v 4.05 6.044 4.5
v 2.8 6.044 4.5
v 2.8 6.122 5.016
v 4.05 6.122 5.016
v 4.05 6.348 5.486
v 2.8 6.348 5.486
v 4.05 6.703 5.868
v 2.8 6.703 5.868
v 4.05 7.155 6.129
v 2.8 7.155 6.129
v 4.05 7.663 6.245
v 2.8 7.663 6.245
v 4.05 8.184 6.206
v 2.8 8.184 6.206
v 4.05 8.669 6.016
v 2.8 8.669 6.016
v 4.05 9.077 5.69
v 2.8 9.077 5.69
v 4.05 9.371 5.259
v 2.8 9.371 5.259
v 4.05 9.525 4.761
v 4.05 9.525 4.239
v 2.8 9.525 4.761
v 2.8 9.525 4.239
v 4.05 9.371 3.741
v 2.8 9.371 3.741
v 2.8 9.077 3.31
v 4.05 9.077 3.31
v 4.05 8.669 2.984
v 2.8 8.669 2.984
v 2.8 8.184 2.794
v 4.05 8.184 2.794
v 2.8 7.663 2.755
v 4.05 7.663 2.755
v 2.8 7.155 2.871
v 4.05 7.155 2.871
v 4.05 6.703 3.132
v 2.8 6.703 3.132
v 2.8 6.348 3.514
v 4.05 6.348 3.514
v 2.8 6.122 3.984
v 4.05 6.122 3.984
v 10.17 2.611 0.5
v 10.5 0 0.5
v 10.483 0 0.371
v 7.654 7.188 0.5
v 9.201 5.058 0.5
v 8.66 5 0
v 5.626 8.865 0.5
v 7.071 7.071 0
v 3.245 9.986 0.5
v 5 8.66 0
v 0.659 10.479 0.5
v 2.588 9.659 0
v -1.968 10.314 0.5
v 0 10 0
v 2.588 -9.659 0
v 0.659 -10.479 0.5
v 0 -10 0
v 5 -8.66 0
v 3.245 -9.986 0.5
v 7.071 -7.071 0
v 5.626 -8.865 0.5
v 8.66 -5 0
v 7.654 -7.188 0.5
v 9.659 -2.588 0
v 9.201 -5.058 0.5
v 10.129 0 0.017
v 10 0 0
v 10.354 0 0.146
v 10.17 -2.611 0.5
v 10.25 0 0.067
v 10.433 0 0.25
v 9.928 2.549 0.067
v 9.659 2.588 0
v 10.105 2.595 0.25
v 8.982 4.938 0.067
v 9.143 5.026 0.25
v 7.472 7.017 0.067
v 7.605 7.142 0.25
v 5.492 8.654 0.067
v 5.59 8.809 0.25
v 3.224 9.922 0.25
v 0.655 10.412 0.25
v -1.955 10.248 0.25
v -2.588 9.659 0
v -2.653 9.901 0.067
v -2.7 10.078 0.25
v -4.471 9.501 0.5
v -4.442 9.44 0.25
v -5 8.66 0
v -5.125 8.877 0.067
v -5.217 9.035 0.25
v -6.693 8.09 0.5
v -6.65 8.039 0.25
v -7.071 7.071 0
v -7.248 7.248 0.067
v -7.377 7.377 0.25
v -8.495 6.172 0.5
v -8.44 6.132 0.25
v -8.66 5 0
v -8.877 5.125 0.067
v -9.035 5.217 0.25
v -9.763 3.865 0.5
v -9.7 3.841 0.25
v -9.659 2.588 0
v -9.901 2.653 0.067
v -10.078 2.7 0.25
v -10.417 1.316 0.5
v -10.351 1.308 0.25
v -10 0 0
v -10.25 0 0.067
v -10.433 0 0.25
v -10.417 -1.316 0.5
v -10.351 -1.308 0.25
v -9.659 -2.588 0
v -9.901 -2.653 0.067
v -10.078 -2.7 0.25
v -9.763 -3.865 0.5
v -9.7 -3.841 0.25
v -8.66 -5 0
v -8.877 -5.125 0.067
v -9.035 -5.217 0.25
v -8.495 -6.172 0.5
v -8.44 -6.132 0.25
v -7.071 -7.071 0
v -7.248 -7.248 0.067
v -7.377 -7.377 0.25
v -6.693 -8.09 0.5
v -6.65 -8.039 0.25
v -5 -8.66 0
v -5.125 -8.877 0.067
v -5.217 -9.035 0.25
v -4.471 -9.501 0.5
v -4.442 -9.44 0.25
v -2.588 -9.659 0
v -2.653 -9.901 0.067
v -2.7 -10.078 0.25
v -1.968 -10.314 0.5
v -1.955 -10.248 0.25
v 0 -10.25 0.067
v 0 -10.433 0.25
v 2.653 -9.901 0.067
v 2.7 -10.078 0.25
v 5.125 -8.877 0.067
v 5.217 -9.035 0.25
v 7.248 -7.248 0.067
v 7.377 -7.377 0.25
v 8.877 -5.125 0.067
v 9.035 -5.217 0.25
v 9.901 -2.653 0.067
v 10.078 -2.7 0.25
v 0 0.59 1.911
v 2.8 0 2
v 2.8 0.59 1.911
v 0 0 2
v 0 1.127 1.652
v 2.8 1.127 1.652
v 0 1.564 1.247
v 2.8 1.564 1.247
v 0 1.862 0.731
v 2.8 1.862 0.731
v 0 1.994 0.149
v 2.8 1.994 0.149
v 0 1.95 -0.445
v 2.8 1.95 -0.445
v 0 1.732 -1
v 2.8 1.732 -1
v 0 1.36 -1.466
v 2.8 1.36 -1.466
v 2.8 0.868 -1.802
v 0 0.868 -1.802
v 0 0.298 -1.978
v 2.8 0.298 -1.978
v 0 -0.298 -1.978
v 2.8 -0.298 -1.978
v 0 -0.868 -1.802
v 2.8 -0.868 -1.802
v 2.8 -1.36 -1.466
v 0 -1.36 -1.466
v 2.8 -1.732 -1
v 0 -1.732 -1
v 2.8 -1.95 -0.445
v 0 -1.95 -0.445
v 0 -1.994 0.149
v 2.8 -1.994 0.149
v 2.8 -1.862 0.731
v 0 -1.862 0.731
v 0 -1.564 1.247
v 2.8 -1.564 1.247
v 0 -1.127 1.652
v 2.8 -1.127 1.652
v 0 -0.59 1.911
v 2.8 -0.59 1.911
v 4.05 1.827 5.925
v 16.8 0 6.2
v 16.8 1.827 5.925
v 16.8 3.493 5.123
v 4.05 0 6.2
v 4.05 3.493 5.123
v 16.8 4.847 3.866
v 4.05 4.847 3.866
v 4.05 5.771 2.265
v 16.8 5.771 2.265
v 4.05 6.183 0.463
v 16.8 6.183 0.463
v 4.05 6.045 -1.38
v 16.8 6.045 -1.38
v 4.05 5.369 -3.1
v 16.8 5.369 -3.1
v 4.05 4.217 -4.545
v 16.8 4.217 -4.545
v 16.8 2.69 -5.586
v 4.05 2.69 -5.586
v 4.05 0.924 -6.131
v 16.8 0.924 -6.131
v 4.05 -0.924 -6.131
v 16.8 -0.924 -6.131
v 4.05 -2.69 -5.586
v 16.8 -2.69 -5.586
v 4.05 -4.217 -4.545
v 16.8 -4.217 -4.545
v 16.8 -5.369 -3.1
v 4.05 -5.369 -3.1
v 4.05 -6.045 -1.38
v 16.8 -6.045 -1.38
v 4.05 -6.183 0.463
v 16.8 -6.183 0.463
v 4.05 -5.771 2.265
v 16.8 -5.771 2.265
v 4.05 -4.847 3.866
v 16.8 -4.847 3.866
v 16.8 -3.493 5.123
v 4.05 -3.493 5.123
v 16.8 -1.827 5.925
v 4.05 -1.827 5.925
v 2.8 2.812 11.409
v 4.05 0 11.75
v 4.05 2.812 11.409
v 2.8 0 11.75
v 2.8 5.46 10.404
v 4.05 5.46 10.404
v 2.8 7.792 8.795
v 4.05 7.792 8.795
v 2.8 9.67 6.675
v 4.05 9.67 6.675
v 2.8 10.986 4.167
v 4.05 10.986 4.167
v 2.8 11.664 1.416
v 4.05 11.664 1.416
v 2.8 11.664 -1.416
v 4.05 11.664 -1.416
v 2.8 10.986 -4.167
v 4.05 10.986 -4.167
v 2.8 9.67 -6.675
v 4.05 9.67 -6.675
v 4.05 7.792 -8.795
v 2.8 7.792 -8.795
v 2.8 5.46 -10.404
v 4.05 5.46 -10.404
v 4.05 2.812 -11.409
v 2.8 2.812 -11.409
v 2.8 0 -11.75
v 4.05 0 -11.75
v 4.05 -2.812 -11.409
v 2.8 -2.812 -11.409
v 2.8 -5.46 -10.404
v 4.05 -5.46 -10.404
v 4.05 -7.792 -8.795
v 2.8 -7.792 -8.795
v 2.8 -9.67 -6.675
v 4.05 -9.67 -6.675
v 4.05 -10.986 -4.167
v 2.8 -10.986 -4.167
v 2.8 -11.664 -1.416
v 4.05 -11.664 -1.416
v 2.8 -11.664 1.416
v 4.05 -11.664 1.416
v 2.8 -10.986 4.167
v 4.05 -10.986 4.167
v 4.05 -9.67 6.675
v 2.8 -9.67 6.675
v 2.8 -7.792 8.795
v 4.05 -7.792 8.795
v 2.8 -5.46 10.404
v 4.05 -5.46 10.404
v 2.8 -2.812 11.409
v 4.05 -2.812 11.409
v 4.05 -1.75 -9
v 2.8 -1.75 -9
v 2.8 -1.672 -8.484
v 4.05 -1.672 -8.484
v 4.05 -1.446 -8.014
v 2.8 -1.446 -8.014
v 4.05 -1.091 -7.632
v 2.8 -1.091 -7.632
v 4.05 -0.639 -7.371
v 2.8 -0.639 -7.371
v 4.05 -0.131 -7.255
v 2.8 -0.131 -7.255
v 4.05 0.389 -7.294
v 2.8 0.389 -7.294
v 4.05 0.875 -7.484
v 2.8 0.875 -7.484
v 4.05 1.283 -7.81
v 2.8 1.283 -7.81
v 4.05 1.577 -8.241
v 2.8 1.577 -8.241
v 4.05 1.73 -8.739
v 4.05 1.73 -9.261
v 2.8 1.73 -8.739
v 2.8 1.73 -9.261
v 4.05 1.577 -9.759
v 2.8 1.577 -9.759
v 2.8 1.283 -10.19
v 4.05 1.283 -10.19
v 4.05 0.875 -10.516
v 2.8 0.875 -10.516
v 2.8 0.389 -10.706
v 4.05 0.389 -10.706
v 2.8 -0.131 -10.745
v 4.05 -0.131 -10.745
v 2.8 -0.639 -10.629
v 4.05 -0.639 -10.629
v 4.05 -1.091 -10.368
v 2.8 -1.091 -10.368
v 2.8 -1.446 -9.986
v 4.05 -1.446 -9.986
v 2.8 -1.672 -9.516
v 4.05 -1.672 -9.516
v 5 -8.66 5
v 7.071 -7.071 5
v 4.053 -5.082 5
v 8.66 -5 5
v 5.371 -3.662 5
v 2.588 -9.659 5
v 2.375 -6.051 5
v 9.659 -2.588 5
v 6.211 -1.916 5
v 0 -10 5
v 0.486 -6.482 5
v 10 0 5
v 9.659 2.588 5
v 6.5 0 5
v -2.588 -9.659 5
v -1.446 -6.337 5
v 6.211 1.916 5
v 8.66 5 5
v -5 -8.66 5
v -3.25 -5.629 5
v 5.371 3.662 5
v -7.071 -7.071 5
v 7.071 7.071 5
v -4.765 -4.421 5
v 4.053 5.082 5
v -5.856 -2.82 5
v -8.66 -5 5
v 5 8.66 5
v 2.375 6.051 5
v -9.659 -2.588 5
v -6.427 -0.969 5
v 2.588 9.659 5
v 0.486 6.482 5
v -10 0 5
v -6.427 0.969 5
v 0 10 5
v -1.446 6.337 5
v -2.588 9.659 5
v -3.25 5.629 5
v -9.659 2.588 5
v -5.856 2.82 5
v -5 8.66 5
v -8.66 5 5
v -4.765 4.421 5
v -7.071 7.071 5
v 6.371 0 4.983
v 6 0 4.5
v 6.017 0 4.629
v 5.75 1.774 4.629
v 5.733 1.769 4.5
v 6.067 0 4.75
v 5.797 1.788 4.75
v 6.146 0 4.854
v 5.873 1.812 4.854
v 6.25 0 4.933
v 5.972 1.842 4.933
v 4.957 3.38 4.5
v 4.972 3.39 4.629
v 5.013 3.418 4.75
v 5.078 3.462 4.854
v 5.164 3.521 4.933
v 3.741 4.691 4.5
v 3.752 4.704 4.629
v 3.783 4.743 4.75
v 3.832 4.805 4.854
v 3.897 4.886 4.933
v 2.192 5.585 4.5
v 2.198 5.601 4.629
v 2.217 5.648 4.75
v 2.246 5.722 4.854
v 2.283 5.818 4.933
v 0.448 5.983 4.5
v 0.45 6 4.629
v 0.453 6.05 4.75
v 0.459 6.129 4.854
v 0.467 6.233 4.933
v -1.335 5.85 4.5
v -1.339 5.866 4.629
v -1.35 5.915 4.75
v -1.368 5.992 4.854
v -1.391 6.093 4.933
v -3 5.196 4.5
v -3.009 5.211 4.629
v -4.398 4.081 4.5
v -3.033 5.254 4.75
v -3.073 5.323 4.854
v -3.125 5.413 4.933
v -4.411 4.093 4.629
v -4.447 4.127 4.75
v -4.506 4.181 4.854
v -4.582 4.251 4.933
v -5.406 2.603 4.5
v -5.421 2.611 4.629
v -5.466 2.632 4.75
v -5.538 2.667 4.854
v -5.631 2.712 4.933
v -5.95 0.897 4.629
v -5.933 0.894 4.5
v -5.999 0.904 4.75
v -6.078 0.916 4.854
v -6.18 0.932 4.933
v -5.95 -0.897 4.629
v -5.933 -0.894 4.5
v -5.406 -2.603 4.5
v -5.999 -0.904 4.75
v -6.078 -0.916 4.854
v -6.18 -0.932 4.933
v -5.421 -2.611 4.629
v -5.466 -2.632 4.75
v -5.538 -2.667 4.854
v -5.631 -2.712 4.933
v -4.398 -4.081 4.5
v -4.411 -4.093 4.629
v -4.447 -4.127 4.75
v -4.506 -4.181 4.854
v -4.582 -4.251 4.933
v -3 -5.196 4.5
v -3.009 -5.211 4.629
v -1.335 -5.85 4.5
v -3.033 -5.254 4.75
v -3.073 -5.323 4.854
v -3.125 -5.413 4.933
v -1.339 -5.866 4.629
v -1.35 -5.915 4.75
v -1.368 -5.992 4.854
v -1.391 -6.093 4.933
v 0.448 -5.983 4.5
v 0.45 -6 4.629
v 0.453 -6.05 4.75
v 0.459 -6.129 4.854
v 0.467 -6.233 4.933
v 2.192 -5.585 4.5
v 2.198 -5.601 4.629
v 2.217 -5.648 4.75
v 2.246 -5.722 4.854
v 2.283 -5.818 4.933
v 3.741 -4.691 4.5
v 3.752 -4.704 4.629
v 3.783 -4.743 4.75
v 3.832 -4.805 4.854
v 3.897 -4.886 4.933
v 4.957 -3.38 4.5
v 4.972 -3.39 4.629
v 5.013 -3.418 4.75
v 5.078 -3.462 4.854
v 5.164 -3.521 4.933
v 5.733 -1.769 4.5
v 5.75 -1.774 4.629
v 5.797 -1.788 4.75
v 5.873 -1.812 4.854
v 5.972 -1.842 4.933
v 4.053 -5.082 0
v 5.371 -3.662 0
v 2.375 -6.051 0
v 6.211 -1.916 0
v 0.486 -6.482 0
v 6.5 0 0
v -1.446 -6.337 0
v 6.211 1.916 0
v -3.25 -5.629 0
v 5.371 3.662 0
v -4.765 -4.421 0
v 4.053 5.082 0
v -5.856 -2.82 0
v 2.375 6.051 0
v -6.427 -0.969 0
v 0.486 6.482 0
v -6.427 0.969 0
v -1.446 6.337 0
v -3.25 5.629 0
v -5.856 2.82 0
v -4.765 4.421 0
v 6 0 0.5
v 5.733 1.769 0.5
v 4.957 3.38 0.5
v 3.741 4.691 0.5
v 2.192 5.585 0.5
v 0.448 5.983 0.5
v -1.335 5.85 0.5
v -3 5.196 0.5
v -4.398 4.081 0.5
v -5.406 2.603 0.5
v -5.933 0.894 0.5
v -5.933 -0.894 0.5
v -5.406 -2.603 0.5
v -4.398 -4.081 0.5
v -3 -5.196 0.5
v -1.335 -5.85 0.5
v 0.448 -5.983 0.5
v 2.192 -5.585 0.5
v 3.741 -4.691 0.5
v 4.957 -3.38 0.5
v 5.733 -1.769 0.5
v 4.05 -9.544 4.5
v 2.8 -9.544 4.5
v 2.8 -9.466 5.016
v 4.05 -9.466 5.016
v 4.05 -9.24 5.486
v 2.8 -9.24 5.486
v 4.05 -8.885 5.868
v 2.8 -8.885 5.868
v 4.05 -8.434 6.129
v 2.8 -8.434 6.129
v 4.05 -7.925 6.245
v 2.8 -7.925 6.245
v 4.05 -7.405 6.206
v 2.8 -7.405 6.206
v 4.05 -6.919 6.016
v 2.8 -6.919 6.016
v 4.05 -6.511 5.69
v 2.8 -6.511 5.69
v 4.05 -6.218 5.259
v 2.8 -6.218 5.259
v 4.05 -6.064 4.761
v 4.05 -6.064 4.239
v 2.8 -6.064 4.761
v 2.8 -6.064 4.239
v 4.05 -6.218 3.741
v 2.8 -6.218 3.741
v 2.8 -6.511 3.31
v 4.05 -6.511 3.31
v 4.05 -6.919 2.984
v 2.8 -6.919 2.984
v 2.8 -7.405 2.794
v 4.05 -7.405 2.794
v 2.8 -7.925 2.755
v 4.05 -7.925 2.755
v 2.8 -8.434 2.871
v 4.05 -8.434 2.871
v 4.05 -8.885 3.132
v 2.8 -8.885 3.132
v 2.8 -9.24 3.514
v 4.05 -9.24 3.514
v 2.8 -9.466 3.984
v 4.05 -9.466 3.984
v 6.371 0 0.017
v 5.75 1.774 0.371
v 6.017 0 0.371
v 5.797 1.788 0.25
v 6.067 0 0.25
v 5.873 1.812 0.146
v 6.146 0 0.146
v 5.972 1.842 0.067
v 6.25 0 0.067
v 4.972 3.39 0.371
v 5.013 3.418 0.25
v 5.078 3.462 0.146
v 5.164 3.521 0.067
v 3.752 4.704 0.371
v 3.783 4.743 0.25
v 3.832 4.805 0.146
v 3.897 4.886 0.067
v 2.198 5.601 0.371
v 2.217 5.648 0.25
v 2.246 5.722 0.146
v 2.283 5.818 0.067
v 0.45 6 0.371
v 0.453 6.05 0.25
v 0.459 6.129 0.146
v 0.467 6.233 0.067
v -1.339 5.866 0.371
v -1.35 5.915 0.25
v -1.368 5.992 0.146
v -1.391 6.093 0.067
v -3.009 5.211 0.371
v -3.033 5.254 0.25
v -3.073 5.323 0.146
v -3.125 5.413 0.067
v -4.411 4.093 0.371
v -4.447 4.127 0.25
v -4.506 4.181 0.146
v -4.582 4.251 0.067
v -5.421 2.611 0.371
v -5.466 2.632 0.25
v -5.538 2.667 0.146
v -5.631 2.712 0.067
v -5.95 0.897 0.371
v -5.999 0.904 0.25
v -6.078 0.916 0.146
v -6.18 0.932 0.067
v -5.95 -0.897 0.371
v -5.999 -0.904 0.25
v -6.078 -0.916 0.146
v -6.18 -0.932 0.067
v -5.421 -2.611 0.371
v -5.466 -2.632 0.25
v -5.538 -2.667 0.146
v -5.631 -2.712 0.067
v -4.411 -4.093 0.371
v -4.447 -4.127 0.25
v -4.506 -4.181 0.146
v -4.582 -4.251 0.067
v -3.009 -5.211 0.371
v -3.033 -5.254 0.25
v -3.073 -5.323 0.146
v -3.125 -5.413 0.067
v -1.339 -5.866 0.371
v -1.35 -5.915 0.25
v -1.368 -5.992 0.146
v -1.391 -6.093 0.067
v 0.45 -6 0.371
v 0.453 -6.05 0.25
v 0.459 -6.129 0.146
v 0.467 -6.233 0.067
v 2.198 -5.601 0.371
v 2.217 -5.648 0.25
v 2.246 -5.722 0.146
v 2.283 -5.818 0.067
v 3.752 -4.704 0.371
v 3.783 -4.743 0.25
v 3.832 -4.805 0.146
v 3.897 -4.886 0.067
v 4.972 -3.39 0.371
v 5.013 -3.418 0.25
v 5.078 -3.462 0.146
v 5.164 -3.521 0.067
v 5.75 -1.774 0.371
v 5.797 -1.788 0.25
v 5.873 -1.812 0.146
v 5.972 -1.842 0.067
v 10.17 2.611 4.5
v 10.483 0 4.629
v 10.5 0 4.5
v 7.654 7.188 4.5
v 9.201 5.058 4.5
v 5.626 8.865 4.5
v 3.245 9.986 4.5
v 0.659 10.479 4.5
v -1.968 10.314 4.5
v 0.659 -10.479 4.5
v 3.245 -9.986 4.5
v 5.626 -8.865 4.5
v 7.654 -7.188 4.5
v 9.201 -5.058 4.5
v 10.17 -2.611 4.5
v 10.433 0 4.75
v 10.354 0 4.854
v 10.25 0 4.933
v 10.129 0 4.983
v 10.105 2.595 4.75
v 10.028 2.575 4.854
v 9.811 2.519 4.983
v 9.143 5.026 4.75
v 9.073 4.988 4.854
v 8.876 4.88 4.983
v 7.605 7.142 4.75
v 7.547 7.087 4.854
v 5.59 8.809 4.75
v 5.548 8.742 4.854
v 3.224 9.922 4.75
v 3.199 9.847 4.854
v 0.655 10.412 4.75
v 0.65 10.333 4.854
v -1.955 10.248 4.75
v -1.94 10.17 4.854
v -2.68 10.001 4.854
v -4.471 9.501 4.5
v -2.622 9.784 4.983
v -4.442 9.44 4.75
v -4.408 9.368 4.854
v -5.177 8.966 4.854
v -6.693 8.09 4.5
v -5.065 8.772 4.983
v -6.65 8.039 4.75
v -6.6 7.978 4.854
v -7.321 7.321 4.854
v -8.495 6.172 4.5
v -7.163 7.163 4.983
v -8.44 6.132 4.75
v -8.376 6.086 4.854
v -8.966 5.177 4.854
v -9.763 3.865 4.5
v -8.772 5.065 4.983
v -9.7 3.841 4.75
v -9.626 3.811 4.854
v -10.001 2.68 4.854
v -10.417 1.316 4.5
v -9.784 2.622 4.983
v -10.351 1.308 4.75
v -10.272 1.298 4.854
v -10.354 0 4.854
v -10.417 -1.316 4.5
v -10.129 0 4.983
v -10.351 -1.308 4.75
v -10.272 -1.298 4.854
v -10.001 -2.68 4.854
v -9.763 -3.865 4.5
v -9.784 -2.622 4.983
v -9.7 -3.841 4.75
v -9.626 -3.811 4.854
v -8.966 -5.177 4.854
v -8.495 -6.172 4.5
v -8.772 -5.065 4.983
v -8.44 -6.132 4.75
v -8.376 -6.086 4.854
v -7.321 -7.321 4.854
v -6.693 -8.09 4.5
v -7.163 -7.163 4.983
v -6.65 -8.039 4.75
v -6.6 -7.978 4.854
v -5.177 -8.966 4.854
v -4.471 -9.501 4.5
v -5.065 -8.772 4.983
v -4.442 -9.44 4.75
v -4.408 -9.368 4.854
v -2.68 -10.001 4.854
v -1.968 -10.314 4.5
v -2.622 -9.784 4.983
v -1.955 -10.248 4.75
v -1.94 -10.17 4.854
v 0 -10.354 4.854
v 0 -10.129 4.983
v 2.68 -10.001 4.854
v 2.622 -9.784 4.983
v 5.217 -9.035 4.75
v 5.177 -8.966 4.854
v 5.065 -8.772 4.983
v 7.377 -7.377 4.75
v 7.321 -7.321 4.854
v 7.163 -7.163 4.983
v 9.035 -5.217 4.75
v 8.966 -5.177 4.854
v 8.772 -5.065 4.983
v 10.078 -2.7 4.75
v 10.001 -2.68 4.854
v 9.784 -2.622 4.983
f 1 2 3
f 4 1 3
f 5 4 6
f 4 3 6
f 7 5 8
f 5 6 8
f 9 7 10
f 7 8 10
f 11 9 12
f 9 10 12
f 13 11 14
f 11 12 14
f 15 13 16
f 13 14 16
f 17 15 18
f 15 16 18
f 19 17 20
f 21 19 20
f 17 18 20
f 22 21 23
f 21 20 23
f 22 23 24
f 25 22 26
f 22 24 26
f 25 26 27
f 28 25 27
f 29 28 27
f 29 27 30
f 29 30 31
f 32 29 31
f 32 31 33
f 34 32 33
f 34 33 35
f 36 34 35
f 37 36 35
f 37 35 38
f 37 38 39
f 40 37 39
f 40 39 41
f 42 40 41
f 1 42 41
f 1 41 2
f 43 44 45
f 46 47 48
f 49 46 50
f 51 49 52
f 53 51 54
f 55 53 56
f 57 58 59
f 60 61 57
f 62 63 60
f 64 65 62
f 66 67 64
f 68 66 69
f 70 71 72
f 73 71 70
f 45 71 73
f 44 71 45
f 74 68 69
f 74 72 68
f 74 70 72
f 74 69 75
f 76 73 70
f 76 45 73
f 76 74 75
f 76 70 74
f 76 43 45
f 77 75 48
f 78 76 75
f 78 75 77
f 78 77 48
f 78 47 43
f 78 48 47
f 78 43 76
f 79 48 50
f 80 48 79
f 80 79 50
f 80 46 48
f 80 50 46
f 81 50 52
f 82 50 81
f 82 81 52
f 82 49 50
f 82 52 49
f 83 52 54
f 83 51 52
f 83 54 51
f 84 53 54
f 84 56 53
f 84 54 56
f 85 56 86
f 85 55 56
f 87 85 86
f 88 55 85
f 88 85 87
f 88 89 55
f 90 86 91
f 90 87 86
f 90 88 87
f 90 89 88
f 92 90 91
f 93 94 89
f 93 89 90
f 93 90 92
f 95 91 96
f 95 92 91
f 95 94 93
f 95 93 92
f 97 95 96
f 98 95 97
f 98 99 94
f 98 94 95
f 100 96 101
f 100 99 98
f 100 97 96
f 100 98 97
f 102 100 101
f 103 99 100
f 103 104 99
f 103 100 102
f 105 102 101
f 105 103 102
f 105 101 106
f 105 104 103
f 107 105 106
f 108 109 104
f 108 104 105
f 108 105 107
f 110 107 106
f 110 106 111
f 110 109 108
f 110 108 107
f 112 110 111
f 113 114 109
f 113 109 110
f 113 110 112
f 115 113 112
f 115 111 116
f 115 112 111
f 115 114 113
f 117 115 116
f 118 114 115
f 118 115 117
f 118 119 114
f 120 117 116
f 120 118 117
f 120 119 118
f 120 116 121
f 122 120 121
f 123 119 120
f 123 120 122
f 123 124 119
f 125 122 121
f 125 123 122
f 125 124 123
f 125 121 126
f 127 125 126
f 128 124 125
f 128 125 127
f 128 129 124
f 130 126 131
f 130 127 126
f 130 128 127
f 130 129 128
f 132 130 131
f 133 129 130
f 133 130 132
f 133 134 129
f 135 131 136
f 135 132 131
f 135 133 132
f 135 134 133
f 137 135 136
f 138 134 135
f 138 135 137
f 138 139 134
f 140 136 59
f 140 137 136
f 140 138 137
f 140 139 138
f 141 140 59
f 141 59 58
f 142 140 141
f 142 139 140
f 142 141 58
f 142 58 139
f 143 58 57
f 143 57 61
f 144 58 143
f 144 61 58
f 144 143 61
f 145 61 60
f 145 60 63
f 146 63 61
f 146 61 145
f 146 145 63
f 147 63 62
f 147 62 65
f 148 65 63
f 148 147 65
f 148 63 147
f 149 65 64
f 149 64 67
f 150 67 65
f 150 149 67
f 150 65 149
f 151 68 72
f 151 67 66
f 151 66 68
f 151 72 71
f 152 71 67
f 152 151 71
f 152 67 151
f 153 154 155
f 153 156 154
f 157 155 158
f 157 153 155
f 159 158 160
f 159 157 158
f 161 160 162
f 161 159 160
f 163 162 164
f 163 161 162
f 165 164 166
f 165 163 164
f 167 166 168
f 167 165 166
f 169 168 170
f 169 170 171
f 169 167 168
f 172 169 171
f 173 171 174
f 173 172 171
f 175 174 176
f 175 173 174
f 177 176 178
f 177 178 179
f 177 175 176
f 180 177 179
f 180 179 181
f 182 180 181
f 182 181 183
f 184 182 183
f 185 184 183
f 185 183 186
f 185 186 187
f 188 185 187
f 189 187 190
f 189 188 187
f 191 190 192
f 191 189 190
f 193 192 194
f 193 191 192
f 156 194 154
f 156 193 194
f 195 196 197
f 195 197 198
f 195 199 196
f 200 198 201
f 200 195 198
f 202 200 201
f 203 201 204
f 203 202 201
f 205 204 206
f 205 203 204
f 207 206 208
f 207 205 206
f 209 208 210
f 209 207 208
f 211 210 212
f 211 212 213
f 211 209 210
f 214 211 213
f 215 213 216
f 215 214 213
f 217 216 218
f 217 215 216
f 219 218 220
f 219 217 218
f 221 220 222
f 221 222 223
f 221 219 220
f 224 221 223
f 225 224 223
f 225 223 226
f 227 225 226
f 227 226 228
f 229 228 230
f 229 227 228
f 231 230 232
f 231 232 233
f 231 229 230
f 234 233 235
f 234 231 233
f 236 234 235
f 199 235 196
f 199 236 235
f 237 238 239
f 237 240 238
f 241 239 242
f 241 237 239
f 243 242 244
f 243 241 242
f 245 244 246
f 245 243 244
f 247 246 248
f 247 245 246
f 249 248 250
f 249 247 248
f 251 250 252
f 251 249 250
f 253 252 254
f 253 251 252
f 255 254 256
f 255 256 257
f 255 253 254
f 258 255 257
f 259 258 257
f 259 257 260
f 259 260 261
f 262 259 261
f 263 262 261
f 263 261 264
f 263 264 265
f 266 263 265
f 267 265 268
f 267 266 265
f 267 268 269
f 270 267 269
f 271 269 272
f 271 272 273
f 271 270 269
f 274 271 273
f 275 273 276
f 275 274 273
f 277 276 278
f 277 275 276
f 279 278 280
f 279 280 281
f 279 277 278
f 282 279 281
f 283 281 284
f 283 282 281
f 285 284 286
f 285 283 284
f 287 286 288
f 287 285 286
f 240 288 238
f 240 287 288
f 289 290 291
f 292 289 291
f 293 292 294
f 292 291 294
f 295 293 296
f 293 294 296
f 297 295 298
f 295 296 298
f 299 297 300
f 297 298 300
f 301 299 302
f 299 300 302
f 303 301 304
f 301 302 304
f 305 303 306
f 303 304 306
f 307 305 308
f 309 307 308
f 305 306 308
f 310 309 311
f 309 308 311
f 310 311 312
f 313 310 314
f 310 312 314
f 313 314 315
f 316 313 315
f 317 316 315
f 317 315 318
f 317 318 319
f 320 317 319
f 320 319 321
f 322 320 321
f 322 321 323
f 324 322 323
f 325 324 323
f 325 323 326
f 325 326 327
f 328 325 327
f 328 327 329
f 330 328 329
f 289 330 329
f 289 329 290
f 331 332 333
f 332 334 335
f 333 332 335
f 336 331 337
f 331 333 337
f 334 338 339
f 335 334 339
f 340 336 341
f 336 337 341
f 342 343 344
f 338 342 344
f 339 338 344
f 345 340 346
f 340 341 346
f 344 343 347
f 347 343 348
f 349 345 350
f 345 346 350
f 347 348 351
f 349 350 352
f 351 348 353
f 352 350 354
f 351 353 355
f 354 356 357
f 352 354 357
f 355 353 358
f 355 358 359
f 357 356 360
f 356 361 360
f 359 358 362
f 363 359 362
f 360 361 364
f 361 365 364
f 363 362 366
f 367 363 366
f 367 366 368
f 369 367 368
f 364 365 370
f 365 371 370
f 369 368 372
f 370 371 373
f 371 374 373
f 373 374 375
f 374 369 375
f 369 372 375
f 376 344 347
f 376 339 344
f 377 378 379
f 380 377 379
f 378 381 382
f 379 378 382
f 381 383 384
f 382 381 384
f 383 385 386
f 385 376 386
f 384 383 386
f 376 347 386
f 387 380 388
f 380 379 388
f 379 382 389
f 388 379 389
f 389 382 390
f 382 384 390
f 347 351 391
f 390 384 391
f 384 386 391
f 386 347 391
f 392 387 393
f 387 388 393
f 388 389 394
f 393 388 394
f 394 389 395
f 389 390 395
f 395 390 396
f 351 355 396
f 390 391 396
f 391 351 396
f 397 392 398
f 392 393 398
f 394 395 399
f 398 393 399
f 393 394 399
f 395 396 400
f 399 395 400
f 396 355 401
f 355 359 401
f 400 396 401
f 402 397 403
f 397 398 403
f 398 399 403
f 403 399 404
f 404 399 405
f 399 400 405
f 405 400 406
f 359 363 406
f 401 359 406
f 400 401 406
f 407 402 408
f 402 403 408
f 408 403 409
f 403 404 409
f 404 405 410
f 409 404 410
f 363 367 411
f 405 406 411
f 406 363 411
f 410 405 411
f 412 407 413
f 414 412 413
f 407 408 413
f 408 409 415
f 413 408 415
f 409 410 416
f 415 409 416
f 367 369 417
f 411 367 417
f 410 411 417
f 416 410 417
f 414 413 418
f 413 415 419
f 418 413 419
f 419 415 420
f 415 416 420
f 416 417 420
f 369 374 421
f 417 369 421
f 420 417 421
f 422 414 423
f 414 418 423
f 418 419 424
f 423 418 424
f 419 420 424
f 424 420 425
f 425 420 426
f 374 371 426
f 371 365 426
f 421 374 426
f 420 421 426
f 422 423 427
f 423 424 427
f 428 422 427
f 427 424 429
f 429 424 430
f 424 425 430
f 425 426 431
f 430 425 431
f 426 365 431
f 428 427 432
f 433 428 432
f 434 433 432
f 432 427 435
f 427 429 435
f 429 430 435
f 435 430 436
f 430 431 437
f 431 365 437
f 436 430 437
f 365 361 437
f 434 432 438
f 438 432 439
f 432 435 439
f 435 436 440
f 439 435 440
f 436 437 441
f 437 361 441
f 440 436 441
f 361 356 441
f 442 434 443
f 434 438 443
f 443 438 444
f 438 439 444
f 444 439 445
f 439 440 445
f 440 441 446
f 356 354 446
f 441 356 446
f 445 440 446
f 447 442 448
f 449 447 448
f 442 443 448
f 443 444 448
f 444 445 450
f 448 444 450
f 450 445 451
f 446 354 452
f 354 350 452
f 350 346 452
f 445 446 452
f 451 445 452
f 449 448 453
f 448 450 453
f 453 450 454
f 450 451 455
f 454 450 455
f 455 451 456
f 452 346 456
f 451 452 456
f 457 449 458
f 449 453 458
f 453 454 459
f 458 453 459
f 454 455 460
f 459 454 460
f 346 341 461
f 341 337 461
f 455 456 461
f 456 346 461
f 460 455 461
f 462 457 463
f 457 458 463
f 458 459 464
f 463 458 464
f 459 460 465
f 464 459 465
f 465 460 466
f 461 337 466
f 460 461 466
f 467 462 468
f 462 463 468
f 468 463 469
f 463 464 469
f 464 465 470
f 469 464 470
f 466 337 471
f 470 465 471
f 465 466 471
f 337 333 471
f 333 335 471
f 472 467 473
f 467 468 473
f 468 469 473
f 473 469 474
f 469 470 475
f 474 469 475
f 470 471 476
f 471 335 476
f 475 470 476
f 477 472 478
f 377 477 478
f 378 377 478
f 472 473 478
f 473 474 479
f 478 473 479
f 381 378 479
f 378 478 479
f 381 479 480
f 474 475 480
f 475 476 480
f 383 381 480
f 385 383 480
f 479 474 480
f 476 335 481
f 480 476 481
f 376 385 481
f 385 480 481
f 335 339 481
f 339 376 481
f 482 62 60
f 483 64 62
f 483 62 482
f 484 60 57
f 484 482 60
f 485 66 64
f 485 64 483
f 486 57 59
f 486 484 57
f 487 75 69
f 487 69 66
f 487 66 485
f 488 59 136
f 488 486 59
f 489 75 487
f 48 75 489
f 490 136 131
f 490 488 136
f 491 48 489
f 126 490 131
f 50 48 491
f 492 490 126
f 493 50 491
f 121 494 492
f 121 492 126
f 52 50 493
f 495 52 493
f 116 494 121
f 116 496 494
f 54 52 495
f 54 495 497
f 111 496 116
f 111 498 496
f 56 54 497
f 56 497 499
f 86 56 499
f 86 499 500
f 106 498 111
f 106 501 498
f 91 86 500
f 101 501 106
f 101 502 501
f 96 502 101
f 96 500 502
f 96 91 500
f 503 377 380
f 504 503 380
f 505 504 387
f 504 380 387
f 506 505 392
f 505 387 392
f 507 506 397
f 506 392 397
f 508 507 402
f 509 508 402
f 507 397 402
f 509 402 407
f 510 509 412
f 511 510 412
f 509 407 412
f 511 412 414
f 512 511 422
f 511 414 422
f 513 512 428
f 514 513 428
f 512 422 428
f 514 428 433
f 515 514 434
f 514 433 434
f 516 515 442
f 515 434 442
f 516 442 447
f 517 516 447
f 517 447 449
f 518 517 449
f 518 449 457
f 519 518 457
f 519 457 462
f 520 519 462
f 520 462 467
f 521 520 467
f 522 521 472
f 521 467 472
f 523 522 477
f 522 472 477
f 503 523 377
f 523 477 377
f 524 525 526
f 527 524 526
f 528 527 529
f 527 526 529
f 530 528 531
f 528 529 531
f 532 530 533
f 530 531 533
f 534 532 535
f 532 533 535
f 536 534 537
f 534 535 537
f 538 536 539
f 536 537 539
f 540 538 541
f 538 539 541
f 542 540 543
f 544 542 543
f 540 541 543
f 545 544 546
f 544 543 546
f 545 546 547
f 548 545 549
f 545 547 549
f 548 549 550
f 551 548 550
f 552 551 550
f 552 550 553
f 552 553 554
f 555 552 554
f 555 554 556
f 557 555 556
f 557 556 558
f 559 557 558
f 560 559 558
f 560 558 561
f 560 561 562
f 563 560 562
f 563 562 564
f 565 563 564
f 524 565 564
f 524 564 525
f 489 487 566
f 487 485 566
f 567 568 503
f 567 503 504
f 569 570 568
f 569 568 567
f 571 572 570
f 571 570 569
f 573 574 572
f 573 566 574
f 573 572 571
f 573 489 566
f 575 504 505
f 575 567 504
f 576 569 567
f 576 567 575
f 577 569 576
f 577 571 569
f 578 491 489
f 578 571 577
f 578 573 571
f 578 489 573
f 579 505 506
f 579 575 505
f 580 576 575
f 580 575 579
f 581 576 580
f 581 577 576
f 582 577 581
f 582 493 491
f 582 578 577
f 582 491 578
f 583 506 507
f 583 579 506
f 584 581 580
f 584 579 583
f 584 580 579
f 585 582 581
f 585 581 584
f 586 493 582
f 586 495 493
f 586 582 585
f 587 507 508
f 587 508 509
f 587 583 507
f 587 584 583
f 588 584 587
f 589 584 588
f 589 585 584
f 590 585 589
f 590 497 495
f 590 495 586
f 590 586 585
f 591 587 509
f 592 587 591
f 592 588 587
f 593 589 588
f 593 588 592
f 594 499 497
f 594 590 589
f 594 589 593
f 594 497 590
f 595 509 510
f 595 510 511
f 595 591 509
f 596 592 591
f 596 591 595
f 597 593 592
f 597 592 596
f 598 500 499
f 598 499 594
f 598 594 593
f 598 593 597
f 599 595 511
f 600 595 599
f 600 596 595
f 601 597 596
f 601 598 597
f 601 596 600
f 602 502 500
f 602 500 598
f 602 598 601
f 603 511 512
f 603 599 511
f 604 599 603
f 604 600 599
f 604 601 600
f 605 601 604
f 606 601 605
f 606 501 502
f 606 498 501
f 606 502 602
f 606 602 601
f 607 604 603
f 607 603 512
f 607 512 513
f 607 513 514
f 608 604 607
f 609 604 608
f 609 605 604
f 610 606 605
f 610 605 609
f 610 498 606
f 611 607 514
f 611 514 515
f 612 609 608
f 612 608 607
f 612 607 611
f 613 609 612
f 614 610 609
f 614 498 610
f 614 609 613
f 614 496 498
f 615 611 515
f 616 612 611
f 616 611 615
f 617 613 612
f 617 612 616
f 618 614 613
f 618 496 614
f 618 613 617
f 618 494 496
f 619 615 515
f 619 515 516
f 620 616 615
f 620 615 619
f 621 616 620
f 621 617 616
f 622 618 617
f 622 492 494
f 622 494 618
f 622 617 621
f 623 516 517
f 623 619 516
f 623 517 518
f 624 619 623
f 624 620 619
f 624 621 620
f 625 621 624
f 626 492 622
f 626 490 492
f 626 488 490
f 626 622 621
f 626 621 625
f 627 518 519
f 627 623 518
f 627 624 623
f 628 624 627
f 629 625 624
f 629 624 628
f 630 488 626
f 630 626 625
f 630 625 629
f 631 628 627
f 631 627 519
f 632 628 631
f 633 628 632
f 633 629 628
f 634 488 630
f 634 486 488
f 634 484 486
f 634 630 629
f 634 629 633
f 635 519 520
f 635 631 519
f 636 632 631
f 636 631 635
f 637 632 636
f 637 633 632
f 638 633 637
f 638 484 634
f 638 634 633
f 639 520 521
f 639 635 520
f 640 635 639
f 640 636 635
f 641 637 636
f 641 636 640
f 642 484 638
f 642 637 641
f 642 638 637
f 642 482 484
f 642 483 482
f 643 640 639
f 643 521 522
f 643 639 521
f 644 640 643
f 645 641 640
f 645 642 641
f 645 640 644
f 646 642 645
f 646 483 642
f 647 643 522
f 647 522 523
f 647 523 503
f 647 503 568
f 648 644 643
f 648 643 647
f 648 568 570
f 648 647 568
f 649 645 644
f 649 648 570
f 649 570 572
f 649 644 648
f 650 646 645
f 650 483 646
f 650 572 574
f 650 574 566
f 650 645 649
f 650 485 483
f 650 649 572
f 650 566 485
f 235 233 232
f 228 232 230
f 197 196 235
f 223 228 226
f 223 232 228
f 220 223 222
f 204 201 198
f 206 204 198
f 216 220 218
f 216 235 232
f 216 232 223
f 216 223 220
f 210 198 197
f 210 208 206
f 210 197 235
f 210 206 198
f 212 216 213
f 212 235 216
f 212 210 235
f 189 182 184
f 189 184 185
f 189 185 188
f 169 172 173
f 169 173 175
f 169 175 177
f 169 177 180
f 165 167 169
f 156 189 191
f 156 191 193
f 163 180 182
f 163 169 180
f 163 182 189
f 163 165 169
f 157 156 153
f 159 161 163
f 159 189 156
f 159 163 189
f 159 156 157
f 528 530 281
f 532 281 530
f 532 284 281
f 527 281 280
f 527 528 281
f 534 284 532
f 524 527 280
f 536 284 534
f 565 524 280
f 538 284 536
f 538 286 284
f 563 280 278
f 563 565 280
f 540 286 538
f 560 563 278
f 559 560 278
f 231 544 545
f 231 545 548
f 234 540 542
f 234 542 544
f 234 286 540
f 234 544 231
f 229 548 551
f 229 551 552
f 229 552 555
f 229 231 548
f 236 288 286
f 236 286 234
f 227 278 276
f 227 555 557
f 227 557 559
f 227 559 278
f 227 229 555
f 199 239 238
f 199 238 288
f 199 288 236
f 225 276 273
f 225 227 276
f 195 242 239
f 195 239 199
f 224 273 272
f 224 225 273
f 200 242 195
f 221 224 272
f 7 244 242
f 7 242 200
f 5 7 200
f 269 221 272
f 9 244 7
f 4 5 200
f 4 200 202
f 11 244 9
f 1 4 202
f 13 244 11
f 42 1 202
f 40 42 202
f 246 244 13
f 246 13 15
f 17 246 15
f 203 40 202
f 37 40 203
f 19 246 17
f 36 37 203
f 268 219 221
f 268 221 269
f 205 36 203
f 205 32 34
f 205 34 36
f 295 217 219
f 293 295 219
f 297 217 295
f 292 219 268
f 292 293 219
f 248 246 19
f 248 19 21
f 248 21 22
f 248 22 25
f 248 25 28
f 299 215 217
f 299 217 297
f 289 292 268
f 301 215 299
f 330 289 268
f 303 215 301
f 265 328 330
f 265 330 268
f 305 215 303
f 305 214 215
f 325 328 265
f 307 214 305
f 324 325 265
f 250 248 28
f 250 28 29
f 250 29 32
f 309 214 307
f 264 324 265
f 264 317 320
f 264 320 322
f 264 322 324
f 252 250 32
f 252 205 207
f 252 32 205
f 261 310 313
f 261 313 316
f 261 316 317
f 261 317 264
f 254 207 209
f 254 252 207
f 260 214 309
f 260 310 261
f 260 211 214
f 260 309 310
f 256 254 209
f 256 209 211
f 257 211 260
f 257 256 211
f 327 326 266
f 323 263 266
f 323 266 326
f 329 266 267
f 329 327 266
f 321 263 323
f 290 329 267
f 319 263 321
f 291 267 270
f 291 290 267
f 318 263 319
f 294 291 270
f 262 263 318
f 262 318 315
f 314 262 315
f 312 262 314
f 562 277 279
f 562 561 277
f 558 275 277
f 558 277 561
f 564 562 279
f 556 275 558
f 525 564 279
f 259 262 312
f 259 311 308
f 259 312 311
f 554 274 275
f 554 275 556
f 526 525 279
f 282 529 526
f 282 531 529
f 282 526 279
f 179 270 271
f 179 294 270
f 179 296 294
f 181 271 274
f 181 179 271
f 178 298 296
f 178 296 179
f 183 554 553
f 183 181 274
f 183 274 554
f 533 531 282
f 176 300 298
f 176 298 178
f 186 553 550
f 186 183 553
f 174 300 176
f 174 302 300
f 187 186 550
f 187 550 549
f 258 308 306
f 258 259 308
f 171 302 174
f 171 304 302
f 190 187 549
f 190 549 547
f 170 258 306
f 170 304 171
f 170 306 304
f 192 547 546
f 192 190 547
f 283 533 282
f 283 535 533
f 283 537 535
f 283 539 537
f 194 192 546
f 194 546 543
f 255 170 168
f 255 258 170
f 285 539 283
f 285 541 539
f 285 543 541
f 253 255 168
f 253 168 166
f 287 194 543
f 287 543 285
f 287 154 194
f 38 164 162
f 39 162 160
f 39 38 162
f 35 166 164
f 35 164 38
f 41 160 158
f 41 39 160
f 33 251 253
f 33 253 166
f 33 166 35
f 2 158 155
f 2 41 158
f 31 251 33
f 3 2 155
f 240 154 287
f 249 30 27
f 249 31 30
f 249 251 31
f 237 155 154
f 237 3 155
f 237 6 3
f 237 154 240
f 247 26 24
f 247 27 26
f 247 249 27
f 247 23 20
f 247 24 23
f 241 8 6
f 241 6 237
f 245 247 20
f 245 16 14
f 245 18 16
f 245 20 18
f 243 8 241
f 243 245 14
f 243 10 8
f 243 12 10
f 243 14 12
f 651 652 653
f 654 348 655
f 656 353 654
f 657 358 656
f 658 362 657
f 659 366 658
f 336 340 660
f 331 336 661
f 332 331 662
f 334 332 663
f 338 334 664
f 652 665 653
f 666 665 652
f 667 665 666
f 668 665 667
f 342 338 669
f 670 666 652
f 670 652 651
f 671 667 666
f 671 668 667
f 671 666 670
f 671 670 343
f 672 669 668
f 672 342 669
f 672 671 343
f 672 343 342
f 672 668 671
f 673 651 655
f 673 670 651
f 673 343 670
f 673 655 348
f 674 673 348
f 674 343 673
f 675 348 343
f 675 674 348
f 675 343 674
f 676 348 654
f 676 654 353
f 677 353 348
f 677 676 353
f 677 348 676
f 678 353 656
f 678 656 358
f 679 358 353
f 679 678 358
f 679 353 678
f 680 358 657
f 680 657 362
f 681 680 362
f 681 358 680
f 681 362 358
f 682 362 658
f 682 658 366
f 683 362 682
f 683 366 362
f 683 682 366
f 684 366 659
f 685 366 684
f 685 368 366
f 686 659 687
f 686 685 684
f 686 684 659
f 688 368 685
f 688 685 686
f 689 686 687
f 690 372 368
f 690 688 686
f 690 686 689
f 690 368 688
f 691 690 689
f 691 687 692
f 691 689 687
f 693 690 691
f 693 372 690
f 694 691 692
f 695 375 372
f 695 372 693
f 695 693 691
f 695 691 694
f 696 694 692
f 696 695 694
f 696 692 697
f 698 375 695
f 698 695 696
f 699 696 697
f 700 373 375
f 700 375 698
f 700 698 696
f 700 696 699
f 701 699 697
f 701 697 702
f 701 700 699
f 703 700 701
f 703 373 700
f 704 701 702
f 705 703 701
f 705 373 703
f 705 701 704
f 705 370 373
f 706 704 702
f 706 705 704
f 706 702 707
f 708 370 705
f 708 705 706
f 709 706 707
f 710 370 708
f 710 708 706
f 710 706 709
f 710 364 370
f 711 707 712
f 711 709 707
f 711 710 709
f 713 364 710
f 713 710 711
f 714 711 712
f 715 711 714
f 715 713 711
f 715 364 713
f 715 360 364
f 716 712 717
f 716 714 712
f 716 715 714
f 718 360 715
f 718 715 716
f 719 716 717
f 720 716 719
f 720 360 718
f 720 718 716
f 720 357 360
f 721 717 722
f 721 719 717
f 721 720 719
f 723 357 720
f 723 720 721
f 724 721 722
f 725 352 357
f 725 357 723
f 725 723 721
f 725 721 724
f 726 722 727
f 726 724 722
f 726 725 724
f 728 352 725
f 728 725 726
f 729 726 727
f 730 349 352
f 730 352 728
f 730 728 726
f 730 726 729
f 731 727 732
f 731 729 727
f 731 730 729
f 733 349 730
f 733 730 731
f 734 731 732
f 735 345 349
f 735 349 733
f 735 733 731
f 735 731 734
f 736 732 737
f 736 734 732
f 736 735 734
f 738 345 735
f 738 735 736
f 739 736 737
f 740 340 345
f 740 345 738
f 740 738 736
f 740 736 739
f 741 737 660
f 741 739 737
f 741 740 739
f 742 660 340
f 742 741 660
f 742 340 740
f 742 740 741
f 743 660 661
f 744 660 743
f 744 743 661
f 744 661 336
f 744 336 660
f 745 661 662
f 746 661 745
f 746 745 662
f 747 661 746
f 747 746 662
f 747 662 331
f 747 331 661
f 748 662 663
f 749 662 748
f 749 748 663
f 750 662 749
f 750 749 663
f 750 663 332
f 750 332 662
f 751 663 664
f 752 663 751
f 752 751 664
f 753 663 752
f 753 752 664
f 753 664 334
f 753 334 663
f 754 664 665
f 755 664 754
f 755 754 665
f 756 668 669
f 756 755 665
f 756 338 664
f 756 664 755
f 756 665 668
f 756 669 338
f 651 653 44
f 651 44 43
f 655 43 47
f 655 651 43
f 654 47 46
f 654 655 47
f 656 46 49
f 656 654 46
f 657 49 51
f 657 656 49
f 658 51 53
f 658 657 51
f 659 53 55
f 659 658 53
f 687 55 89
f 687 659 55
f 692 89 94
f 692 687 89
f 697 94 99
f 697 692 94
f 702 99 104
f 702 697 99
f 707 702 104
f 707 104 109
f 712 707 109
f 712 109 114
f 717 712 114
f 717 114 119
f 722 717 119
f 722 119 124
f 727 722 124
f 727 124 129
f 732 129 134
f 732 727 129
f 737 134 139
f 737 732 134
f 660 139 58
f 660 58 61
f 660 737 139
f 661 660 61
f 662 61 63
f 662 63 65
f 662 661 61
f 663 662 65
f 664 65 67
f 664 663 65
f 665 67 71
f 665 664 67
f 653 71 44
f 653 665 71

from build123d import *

# Parameters (mm, degrees)
F2_R     = 1.75
F3_DEPTH = 14.001
F4_W     = 4.5
F4_H     = 5
F6_R     = 0.5


with BuildPart() as f1:
    # F0 (on Front) → F1 (revolve)
    with BuildSketch(Plane.XZ):
        Polygon((2.8, 11.75), (2.8, 2), (0, 2), (0, 0), (16.8, 0), (16.8, 6.2), (4.05, 6.2), (4.05, 11.75), align=None)
    revolve(axis=Axis((-2.24936, 0, 0), (-1, 0, 0)))

    # F2 (on face) → F3 (cut, through all)
    with BuildSketch(Plane(origin=(2.8, 0, 0), x_dir=(0, -1, 0), z_dir=(-1, 0, 0))):
        with Locations((-7.794229, 4.5)):
            Circle(F2_R)
        with Locations((7.794229, 4.5)):
            Circle(F2_R)
        with Locations((0, -9)):
            Circle(F2_R)
    extrude(amount=-F3_DEPTH, mode=Mode.SUBTRACT)


with BuildPart() as f5:
    # F4 (on Front) → F5 (revolve)
    with BuildSketch(Plane.XZ):
        with Locations((8.25, 2.5)):
            Rectangle(F4_W, F4_H)
    revolve(axis=Axis((0, 0, 0.355656), (0, 0, 1)))

    # F6
    f6_edges = [f5.edges().sort_by_distance(p)[0] for p in [
        (-10.5, 0, 5),
        (-6, 0, 5),
        (-6, 0, 0),
        (-10.5, 0, 0),
    ]]
    fillet(f6_edges, radius=F6_R)


solid = Compound([f1.part, f5.part])
